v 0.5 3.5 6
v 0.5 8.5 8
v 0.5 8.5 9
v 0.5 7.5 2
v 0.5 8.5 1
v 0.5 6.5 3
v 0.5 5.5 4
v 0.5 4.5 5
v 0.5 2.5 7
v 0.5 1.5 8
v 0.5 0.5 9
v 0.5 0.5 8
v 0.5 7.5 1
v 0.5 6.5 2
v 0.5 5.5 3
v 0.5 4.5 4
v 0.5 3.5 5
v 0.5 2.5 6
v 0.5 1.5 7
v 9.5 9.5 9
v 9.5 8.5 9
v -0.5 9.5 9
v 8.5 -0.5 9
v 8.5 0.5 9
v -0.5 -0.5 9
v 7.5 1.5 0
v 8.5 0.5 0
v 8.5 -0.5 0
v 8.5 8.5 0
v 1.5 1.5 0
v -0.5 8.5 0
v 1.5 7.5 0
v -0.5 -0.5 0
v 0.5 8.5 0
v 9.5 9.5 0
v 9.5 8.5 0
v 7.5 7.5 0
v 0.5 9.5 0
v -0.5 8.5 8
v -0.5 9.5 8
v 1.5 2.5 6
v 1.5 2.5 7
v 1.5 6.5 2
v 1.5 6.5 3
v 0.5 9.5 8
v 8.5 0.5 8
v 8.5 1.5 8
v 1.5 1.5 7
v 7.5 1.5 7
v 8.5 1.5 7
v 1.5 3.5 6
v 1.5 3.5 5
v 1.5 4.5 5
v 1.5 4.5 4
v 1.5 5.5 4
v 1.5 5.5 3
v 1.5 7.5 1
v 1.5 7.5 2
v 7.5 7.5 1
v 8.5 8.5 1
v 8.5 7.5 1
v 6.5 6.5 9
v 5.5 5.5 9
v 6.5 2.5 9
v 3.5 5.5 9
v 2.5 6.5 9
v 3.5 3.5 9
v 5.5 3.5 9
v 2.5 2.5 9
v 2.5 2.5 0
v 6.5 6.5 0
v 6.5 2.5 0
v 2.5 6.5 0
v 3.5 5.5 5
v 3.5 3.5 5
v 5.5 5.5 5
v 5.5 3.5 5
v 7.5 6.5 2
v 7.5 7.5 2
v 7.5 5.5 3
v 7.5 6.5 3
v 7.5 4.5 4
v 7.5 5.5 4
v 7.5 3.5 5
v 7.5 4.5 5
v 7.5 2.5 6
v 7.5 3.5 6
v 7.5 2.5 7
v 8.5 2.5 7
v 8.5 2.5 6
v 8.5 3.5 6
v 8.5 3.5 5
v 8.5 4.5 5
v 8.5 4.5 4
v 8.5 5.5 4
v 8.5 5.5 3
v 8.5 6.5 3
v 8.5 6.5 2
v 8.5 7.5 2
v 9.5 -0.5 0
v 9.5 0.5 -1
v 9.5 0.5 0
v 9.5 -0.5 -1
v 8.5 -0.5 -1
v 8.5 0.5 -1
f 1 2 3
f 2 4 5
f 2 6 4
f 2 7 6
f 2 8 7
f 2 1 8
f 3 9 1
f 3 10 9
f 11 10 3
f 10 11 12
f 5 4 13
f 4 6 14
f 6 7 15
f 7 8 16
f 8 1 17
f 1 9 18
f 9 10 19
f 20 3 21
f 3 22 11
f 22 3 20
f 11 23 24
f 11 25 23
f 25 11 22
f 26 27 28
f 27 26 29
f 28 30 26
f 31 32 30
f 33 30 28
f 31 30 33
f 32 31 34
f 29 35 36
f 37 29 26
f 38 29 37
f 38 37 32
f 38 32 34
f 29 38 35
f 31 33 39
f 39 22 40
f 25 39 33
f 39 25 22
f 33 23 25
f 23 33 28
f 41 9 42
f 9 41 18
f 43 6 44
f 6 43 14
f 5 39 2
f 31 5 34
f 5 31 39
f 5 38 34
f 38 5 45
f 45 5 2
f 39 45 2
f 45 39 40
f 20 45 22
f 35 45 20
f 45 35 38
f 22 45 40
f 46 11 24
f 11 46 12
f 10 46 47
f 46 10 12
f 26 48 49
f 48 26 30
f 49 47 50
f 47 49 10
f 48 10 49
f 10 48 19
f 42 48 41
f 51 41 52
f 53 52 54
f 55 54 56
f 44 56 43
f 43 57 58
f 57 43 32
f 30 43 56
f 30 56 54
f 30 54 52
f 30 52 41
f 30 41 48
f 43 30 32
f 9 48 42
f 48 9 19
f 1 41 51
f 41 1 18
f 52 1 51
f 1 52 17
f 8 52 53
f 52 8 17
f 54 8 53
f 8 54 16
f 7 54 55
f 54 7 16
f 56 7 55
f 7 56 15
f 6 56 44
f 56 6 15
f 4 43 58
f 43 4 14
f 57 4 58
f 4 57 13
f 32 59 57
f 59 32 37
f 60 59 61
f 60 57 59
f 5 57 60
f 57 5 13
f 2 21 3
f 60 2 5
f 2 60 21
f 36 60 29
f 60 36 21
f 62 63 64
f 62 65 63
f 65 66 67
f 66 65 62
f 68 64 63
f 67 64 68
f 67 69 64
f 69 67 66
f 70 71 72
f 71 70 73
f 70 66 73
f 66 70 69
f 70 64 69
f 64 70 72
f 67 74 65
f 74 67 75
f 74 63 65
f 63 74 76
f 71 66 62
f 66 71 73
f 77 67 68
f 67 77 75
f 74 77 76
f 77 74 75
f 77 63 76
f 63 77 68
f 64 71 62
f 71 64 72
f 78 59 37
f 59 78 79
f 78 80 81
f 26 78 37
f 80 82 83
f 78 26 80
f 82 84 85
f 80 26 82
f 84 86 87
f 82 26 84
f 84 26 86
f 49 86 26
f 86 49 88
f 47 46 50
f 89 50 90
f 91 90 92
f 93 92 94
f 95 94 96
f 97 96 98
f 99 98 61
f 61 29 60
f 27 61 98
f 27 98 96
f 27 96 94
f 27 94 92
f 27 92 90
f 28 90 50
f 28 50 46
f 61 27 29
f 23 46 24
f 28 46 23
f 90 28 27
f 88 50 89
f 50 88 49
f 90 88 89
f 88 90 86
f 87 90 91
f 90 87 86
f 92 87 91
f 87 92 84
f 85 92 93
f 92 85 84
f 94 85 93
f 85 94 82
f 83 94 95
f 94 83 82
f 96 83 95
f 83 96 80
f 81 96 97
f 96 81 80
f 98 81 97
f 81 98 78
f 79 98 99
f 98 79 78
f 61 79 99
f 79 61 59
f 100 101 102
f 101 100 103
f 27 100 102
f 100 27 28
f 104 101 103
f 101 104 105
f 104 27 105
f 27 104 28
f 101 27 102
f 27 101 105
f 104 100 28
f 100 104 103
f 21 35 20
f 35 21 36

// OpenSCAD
union() {
    translate([0, 0, 4.5]) cube([1, 1, 9], center=true);
    translate([0, 1, 4.5]) cube([1, 1, 9], center=true);
    translate([0, 2, 4.5]) cube([1, 1, 9], center=true);
    translate([0, 3, 4.5]) cube([1, 1, 9], center=true);
    translate([0, 4, 4.5]) cube([1, 1, 9], center=true);
    translate([0, 5, 4.5]) cube([1, 1, 9], center=true);
    translate([0, 6, 4.5]) cube([1, 1, 9], center=true);
    translate([0, 7, 4.5]) cube([1, 1, 9], center=true);
    translate([0, 8, 4.5]) cube([1, 1, 9], center=true);
    translate([0, 9, 8.5]) color([0, 0, 1]) cube([1, 1, 1], center=true);
    translate([1, 0, 4.5]) cube([1, 1, 9], center=true);
    translate([1, 1, 4.0]) cube([1, 1, 8], center=true);
    translate([1, 2, 3.5]) cube([1, 1, 7], center=true);
    translate([1, 3, 3.0]) cube([1, 1, 6], center=true);
    translate([1, 4, 2.5]) cube([1, 1, 5], center=true);
    translate([1, 5, 2.0]) cube([1, 1, 4], center=true);
    translate([1, 6, 1.5]) cube([1, 1, 3], center=true);
    translate([1, 7, 1.0]) cube([1, 1, 2], center=true);
    translate([1, 8, 0.5]) cube([1, 1, 1], center=true);
    translate([1, 9, 4.5]) cube([1, 1, 9], center=true);
    translate([2, 0, 4.5]) cube([1, 1, 9], center=true);
    translate([2, 1, 4.0]) cube([1, 1, 8], center=true);
    translate([2, 8, 0.5]) cube([1, 1, 1], center=true);
    translate([2, 9, 4.5]) cube([1, 1, 9], center=true);
    translate([3, 0, 4.5]) cube([1, 1, 9], center=true);
    translate([3, 1, 4.0]) cube([1, 1, 8], center=true);
    translate([3, 3, 4.5]) cube([1, 1, 9], center=true);
    translate([3, 4, 4.5]) cube([1, 1, 9], center=true);
    translate([3, 5, 4.5]) cube([1, 1, 9], center=true);
    translate([3, 6, 4.5]) cube([1, 1, 9], center=true);
    translate([3, 8, 0.5]) cube([1, 1, 1], center=true);
    translate([3, 9, 4.5]) cube([1, 1, 9], center=true);
    translate([4, 0, 4.5]) cube([1, 1, 9], center=true);
    translate([4, 1, 4.0]) cube([1, 1, 8], center=true);
    translate([4, 3, 4.5]) cube([1, 1, 9], center=true);
    translate([4, 4, 2.5]) cube([1, 1, 5], center=true);
    translate([4, 5, 2.5]) cube([1, 1, 5], center=true);
    translate([4, 6, 4.5]) cube([1, 1, 9], center=true);
    translate([4, 8, 0.5]) cube([1, 1, 1], center=true);
    translate([4, 9, 4.5]) cube([1, 1, 9], center=true);
    translate([5, 0, 4.5]) cube([1, 1, 9], center=true);
    translate([5, 1, 4.0]) cube([1, 1, 8], center=true);
    translate([5, 3, 4.5]) cube([1, 1, 9], center=true);
    translate([5, 4, 2.5]) cube([1, 1, 5], center=true);
    translate([5, 5, 2.5]) cube([1, 1, 5], center=true);
    translate([5, 6, 4.5]) cube([1, 1, 9], center=true);
    translate([5, 8, 0.5]) cube([1, 1, 1], center=true);
    translate([5, 9, 4.5]) cube([1, 1, 9], center=true);
    translate([6, 0, 4.5]) cube([1, 1, 9], center=true);
    translate([6, 1, 4.0]) cube([1, 1, 8], center=true);
    translate([6, 3, 4.5]) cube([1, 1, 9], center=true);
    translate([6, 4, 4.5]) cube([1, 1, 9], center=true);
    translate([6, 5, 4.5]) cube([1, 1, 9], center=true);
    translate([6, 6, 4.5]) cube([1, 1, 9], center=true);
    translate([6, 8, 0.5]) cube([1, 1, 1], center=true);
    translate([6, 9, 4.5]) cube([1, 1, 9], center=true);
    translate([7, 0, 4.5]) cube([1, 1, 9], center=true);
    translate([7, 1, 4.0]) cube([1, 1, 8], center=true);
    translate([7, 8, 0.5]) cube([1, 1, 1], center=true);
    translate([7, 9, 4.5]) cube([1, 1, 9], center=true);
    translate([8, 0, 4.5]) cube([1, 1, 9], center=true);
    translate([8, 1, 4.0]) cube([1, 1, 8], center=true);
    translate([8, 2, 3.5]) cube([1, 1, 7], center=true);
    translate([8, 3, 3.0]) cube([1, 1, 6], center=true);
    translate([8, 4, 2.5]) cube([1, 1, 5], center=true);
    translate([8, 5, 2.0]) cube([1, 1, 4], center=true);
    translate([8, 6, 1.5]) cube([1, 1, 3], center=true);
    translate([8, 7, 1.0]) cube([1, 1, 2], center=true);
    translate([8, 8, 0.5]) cube([1, 1, 1], center=true);
    translate([8, 9, 4.5]) cube([1, 1, 9], center=true);
    translate([9, 0, -0.5]) color([1, 0, 0]) cube([1, 1, 1], center=true);
    translate([9, 9, 4.5]) cube([1, 1, 9], center=true);
}
